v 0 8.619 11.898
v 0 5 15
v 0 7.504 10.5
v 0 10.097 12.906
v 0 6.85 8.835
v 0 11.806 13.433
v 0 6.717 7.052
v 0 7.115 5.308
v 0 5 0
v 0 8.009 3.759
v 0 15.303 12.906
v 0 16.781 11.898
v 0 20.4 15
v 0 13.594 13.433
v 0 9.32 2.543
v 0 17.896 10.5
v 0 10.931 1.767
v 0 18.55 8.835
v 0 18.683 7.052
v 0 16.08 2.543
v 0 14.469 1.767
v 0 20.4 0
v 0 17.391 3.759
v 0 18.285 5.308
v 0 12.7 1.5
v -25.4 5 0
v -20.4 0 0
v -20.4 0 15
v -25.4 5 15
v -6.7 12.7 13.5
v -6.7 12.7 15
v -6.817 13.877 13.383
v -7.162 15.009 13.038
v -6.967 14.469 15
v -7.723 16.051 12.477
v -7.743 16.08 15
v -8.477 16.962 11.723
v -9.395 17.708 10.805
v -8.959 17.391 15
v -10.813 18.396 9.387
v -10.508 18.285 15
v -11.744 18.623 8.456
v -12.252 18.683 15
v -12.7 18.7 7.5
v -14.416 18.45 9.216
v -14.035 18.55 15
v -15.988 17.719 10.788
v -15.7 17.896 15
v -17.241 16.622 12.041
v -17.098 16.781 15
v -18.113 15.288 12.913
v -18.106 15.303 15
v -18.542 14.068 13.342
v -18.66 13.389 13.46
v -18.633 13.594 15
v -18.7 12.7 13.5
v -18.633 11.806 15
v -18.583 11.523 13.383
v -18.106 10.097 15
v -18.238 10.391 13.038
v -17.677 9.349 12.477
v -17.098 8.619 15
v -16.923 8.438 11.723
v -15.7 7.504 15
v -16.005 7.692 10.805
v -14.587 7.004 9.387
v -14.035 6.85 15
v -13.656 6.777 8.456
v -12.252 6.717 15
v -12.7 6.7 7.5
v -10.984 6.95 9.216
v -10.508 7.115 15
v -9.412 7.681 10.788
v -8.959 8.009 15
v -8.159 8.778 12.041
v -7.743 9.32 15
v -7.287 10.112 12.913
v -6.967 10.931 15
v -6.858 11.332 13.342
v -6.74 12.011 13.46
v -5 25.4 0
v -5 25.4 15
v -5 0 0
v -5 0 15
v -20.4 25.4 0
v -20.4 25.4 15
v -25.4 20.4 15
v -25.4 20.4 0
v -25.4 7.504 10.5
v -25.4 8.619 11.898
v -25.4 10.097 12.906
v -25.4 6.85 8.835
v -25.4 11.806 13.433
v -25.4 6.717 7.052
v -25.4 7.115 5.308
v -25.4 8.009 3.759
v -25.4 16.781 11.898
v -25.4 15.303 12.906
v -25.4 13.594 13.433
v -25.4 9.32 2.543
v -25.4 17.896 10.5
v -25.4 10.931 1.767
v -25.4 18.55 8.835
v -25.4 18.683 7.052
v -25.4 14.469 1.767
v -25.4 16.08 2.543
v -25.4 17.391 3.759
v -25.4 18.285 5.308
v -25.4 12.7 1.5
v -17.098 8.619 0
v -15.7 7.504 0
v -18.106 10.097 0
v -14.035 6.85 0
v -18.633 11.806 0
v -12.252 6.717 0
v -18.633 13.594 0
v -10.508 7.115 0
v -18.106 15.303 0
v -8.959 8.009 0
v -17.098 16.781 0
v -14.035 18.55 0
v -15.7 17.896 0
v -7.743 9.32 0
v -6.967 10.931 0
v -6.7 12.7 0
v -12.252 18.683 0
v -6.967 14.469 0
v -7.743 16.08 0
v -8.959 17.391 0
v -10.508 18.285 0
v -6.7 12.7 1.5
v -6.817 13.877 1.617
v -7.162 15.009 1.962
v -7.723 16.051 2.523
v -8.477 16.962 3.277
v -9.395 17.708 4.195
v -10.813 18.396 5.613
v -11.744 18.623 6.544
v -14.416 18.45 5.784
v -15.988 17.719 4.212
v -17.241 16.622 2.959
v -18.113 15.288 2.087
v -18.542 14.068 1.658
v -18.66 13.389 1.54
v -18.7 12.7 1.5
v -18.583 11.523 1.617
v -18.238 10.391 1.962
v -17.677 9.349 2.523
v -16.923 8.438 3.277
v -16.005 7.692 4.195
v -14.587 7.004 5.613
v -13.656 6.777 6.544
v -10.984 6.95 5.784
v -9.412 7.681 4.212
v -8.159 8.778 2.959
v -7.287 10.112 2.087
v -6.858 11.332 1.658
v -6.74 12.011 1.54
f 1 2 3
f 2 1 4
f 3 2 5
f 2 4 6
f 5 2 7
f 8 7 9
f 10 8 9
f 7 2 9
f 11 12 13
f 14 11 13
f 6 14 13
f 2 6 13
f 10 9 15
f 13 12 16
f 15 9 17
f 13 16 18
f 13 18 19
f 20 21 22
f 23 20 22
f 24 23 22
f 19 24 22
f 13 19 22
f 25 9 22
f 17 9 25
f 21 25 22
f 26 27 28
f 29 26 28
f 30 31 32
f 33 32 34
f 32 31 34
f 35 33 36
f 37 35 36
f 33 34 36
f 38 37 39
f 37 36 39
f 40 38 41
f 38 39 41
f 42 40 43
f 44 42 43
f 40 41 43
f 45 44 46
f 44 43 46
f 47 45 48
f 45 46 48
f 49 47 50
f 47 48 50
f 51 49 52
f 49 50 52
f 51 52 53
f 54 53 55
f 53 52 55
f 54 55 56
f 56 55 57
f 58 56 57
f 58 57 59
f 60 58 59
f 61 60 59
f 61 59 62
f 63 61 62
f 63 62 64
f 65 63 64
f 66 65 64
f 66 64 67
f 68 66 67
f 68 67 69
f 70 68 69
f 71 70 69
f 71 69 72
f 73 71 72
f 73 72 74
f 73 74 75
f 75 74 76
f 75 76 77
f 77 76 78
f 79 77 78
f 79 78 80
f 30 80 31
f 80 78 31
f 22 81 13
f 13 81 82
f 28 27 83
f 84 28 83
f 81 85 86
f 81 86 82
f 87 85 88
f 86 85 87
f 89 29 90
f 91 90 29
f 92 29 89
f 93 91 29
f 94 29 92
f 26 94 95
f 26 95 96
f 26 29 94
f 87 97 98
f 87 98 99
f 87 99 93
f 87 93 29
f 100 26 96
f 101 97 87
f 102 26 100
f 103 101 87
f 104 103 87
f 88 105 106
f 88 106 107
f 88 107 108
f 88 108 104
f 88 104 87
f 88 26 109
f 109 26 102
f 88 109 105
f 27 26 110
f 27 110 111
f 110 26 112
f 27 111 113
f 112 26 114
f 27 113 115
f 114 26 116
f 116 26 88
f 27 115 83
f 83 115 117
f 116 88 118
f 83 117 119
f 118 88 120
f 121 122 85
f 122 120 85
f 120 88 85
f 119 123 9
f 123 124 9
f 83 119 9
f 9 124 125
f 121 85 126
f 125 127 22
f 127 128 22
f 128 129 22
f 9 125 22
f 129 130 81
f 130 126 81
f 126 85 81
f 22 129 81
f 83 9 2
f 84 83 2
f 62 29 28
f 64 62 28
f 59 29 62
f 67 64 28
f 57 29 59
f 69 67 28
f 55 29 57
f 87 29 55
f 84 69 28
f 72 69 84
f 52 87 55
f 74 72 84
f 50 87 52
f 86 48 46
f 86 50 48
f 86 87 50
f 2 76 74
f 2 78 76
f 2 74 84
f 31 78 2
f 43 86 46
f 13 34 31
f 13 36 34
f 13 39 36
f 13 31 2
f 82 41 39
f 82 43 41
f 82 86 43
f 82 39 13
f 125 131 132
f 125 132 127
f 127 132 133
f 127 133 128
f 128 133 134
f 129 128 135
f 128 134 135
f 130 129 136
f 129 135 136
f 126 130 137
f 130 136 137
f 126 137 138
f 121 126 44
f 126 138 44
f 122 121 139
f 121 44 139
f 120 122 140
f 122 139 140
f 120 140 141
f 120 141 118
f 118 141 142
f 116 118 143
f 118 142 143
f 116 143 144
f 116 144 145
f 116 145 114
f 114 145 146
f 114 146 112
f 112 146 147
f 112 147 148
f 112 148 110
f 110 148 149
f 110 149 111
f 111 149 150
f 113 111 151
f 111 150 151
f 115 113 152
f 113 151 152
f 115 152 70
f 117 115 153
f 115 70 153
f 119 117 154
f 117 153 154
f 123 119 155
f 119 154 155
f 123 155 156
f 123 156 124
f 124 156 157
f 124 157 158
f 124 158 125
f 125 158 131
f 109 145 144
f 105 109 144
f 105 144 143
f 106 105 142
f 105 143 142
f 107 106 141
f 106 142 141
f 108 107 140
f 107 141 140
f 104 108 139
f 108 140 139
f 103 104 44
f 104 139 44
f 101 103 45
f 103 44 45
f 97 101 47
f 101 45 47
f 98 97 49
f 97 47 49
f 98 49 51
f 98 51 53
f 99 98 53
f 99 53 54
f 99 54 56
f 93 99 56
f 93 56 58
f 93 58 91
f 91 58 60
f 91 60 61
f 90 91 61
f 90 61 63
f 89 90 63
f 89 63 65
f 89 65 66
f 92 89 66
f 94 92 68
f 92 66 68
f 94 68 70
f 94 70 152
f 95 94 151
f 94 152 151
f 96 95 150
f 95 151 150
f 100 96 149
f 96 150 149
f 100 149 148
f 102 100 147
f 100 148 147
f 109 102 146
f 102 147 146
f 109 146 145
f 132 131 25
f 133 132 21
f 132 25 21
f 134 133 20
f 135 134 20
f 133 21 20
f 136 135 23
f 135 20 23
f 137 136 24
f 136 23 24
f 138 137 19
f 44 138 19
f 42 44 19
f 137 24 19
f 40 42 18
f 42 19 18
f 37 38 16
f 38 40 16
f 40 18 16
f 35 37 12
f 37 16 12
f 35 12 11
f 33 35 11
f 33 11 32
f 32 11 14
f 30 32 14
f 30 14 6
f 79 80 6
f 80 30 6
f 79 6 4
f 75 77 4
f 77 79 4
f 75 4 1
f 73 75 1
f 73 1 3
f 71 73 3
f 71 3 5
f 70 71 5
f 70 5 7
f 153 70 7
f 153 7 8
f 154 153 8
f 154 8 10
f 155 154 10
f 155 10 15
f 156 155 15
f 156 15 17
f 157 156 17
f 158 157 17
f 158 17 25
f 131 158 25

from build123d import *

# Parameters (mm, degrees)
SKETCH1_W           = 25.4
SKETCH1_H           = 25.4
BOSS_EXTRUDE1_DEPTH = 15
CHAMFER1_SIZE       = 5
SKETCH2_R           = 6
CUT_EXTRUDE1_DEPTH  = 39.927111375
SKETCH3_R           = 6
CUT_EXTRUDE2_DEPTH  = 39.927111375


with BuildPart() as part:
    # Sketch1 → Boss-Extrude1 (new body)
    with BuildSketch(Plane.XY):
        with Locations((-12.7, 12.7)):
            Rectangle(SKETCH1_W, SKETCH1_H)
    extrude(amount=BOSS_EXTRUDE1_DEPTH)

    # Chamfer1
    chamfer1_edges = [part.edges().sort_by_distance(p)[0] for p in [
        (0, 25.4, 7.5),
        (0, 0, 7.5),
        (-25.4, 0, 7.5),
        (-25.4, 25.4, 7.5),
    ]]
    chamfer(chamfer1_edges, length=CHAMFER1_SIZE)

    # Sketch2 → Cut-Extrude1 (cut, through all)
    with BuildSketch(Plane.XY.offset(15)):
        with Locations((-12.7, 12.7)):
            Circle(SKETCH2_R)
    extrude(amount=-CUT_EXTRUDE1_DEPTH, mode=Mode.SUBTRACT)

    # Sketch3 → Cut-Extrude2 (cut, through all)
    with BuildSketch(Plane(origin=(0, 0, 0), x_dir=(0, 0, -1), z_dir=(1, 0, 0))):
        with Locations((-7.5, 12.7)):
            Circle(SKETCH3_R)
    extrude(amount=-CUT_EXTRUDE2_DEPTH, mode=Mode.SUBTRACT)


solid = part.part
